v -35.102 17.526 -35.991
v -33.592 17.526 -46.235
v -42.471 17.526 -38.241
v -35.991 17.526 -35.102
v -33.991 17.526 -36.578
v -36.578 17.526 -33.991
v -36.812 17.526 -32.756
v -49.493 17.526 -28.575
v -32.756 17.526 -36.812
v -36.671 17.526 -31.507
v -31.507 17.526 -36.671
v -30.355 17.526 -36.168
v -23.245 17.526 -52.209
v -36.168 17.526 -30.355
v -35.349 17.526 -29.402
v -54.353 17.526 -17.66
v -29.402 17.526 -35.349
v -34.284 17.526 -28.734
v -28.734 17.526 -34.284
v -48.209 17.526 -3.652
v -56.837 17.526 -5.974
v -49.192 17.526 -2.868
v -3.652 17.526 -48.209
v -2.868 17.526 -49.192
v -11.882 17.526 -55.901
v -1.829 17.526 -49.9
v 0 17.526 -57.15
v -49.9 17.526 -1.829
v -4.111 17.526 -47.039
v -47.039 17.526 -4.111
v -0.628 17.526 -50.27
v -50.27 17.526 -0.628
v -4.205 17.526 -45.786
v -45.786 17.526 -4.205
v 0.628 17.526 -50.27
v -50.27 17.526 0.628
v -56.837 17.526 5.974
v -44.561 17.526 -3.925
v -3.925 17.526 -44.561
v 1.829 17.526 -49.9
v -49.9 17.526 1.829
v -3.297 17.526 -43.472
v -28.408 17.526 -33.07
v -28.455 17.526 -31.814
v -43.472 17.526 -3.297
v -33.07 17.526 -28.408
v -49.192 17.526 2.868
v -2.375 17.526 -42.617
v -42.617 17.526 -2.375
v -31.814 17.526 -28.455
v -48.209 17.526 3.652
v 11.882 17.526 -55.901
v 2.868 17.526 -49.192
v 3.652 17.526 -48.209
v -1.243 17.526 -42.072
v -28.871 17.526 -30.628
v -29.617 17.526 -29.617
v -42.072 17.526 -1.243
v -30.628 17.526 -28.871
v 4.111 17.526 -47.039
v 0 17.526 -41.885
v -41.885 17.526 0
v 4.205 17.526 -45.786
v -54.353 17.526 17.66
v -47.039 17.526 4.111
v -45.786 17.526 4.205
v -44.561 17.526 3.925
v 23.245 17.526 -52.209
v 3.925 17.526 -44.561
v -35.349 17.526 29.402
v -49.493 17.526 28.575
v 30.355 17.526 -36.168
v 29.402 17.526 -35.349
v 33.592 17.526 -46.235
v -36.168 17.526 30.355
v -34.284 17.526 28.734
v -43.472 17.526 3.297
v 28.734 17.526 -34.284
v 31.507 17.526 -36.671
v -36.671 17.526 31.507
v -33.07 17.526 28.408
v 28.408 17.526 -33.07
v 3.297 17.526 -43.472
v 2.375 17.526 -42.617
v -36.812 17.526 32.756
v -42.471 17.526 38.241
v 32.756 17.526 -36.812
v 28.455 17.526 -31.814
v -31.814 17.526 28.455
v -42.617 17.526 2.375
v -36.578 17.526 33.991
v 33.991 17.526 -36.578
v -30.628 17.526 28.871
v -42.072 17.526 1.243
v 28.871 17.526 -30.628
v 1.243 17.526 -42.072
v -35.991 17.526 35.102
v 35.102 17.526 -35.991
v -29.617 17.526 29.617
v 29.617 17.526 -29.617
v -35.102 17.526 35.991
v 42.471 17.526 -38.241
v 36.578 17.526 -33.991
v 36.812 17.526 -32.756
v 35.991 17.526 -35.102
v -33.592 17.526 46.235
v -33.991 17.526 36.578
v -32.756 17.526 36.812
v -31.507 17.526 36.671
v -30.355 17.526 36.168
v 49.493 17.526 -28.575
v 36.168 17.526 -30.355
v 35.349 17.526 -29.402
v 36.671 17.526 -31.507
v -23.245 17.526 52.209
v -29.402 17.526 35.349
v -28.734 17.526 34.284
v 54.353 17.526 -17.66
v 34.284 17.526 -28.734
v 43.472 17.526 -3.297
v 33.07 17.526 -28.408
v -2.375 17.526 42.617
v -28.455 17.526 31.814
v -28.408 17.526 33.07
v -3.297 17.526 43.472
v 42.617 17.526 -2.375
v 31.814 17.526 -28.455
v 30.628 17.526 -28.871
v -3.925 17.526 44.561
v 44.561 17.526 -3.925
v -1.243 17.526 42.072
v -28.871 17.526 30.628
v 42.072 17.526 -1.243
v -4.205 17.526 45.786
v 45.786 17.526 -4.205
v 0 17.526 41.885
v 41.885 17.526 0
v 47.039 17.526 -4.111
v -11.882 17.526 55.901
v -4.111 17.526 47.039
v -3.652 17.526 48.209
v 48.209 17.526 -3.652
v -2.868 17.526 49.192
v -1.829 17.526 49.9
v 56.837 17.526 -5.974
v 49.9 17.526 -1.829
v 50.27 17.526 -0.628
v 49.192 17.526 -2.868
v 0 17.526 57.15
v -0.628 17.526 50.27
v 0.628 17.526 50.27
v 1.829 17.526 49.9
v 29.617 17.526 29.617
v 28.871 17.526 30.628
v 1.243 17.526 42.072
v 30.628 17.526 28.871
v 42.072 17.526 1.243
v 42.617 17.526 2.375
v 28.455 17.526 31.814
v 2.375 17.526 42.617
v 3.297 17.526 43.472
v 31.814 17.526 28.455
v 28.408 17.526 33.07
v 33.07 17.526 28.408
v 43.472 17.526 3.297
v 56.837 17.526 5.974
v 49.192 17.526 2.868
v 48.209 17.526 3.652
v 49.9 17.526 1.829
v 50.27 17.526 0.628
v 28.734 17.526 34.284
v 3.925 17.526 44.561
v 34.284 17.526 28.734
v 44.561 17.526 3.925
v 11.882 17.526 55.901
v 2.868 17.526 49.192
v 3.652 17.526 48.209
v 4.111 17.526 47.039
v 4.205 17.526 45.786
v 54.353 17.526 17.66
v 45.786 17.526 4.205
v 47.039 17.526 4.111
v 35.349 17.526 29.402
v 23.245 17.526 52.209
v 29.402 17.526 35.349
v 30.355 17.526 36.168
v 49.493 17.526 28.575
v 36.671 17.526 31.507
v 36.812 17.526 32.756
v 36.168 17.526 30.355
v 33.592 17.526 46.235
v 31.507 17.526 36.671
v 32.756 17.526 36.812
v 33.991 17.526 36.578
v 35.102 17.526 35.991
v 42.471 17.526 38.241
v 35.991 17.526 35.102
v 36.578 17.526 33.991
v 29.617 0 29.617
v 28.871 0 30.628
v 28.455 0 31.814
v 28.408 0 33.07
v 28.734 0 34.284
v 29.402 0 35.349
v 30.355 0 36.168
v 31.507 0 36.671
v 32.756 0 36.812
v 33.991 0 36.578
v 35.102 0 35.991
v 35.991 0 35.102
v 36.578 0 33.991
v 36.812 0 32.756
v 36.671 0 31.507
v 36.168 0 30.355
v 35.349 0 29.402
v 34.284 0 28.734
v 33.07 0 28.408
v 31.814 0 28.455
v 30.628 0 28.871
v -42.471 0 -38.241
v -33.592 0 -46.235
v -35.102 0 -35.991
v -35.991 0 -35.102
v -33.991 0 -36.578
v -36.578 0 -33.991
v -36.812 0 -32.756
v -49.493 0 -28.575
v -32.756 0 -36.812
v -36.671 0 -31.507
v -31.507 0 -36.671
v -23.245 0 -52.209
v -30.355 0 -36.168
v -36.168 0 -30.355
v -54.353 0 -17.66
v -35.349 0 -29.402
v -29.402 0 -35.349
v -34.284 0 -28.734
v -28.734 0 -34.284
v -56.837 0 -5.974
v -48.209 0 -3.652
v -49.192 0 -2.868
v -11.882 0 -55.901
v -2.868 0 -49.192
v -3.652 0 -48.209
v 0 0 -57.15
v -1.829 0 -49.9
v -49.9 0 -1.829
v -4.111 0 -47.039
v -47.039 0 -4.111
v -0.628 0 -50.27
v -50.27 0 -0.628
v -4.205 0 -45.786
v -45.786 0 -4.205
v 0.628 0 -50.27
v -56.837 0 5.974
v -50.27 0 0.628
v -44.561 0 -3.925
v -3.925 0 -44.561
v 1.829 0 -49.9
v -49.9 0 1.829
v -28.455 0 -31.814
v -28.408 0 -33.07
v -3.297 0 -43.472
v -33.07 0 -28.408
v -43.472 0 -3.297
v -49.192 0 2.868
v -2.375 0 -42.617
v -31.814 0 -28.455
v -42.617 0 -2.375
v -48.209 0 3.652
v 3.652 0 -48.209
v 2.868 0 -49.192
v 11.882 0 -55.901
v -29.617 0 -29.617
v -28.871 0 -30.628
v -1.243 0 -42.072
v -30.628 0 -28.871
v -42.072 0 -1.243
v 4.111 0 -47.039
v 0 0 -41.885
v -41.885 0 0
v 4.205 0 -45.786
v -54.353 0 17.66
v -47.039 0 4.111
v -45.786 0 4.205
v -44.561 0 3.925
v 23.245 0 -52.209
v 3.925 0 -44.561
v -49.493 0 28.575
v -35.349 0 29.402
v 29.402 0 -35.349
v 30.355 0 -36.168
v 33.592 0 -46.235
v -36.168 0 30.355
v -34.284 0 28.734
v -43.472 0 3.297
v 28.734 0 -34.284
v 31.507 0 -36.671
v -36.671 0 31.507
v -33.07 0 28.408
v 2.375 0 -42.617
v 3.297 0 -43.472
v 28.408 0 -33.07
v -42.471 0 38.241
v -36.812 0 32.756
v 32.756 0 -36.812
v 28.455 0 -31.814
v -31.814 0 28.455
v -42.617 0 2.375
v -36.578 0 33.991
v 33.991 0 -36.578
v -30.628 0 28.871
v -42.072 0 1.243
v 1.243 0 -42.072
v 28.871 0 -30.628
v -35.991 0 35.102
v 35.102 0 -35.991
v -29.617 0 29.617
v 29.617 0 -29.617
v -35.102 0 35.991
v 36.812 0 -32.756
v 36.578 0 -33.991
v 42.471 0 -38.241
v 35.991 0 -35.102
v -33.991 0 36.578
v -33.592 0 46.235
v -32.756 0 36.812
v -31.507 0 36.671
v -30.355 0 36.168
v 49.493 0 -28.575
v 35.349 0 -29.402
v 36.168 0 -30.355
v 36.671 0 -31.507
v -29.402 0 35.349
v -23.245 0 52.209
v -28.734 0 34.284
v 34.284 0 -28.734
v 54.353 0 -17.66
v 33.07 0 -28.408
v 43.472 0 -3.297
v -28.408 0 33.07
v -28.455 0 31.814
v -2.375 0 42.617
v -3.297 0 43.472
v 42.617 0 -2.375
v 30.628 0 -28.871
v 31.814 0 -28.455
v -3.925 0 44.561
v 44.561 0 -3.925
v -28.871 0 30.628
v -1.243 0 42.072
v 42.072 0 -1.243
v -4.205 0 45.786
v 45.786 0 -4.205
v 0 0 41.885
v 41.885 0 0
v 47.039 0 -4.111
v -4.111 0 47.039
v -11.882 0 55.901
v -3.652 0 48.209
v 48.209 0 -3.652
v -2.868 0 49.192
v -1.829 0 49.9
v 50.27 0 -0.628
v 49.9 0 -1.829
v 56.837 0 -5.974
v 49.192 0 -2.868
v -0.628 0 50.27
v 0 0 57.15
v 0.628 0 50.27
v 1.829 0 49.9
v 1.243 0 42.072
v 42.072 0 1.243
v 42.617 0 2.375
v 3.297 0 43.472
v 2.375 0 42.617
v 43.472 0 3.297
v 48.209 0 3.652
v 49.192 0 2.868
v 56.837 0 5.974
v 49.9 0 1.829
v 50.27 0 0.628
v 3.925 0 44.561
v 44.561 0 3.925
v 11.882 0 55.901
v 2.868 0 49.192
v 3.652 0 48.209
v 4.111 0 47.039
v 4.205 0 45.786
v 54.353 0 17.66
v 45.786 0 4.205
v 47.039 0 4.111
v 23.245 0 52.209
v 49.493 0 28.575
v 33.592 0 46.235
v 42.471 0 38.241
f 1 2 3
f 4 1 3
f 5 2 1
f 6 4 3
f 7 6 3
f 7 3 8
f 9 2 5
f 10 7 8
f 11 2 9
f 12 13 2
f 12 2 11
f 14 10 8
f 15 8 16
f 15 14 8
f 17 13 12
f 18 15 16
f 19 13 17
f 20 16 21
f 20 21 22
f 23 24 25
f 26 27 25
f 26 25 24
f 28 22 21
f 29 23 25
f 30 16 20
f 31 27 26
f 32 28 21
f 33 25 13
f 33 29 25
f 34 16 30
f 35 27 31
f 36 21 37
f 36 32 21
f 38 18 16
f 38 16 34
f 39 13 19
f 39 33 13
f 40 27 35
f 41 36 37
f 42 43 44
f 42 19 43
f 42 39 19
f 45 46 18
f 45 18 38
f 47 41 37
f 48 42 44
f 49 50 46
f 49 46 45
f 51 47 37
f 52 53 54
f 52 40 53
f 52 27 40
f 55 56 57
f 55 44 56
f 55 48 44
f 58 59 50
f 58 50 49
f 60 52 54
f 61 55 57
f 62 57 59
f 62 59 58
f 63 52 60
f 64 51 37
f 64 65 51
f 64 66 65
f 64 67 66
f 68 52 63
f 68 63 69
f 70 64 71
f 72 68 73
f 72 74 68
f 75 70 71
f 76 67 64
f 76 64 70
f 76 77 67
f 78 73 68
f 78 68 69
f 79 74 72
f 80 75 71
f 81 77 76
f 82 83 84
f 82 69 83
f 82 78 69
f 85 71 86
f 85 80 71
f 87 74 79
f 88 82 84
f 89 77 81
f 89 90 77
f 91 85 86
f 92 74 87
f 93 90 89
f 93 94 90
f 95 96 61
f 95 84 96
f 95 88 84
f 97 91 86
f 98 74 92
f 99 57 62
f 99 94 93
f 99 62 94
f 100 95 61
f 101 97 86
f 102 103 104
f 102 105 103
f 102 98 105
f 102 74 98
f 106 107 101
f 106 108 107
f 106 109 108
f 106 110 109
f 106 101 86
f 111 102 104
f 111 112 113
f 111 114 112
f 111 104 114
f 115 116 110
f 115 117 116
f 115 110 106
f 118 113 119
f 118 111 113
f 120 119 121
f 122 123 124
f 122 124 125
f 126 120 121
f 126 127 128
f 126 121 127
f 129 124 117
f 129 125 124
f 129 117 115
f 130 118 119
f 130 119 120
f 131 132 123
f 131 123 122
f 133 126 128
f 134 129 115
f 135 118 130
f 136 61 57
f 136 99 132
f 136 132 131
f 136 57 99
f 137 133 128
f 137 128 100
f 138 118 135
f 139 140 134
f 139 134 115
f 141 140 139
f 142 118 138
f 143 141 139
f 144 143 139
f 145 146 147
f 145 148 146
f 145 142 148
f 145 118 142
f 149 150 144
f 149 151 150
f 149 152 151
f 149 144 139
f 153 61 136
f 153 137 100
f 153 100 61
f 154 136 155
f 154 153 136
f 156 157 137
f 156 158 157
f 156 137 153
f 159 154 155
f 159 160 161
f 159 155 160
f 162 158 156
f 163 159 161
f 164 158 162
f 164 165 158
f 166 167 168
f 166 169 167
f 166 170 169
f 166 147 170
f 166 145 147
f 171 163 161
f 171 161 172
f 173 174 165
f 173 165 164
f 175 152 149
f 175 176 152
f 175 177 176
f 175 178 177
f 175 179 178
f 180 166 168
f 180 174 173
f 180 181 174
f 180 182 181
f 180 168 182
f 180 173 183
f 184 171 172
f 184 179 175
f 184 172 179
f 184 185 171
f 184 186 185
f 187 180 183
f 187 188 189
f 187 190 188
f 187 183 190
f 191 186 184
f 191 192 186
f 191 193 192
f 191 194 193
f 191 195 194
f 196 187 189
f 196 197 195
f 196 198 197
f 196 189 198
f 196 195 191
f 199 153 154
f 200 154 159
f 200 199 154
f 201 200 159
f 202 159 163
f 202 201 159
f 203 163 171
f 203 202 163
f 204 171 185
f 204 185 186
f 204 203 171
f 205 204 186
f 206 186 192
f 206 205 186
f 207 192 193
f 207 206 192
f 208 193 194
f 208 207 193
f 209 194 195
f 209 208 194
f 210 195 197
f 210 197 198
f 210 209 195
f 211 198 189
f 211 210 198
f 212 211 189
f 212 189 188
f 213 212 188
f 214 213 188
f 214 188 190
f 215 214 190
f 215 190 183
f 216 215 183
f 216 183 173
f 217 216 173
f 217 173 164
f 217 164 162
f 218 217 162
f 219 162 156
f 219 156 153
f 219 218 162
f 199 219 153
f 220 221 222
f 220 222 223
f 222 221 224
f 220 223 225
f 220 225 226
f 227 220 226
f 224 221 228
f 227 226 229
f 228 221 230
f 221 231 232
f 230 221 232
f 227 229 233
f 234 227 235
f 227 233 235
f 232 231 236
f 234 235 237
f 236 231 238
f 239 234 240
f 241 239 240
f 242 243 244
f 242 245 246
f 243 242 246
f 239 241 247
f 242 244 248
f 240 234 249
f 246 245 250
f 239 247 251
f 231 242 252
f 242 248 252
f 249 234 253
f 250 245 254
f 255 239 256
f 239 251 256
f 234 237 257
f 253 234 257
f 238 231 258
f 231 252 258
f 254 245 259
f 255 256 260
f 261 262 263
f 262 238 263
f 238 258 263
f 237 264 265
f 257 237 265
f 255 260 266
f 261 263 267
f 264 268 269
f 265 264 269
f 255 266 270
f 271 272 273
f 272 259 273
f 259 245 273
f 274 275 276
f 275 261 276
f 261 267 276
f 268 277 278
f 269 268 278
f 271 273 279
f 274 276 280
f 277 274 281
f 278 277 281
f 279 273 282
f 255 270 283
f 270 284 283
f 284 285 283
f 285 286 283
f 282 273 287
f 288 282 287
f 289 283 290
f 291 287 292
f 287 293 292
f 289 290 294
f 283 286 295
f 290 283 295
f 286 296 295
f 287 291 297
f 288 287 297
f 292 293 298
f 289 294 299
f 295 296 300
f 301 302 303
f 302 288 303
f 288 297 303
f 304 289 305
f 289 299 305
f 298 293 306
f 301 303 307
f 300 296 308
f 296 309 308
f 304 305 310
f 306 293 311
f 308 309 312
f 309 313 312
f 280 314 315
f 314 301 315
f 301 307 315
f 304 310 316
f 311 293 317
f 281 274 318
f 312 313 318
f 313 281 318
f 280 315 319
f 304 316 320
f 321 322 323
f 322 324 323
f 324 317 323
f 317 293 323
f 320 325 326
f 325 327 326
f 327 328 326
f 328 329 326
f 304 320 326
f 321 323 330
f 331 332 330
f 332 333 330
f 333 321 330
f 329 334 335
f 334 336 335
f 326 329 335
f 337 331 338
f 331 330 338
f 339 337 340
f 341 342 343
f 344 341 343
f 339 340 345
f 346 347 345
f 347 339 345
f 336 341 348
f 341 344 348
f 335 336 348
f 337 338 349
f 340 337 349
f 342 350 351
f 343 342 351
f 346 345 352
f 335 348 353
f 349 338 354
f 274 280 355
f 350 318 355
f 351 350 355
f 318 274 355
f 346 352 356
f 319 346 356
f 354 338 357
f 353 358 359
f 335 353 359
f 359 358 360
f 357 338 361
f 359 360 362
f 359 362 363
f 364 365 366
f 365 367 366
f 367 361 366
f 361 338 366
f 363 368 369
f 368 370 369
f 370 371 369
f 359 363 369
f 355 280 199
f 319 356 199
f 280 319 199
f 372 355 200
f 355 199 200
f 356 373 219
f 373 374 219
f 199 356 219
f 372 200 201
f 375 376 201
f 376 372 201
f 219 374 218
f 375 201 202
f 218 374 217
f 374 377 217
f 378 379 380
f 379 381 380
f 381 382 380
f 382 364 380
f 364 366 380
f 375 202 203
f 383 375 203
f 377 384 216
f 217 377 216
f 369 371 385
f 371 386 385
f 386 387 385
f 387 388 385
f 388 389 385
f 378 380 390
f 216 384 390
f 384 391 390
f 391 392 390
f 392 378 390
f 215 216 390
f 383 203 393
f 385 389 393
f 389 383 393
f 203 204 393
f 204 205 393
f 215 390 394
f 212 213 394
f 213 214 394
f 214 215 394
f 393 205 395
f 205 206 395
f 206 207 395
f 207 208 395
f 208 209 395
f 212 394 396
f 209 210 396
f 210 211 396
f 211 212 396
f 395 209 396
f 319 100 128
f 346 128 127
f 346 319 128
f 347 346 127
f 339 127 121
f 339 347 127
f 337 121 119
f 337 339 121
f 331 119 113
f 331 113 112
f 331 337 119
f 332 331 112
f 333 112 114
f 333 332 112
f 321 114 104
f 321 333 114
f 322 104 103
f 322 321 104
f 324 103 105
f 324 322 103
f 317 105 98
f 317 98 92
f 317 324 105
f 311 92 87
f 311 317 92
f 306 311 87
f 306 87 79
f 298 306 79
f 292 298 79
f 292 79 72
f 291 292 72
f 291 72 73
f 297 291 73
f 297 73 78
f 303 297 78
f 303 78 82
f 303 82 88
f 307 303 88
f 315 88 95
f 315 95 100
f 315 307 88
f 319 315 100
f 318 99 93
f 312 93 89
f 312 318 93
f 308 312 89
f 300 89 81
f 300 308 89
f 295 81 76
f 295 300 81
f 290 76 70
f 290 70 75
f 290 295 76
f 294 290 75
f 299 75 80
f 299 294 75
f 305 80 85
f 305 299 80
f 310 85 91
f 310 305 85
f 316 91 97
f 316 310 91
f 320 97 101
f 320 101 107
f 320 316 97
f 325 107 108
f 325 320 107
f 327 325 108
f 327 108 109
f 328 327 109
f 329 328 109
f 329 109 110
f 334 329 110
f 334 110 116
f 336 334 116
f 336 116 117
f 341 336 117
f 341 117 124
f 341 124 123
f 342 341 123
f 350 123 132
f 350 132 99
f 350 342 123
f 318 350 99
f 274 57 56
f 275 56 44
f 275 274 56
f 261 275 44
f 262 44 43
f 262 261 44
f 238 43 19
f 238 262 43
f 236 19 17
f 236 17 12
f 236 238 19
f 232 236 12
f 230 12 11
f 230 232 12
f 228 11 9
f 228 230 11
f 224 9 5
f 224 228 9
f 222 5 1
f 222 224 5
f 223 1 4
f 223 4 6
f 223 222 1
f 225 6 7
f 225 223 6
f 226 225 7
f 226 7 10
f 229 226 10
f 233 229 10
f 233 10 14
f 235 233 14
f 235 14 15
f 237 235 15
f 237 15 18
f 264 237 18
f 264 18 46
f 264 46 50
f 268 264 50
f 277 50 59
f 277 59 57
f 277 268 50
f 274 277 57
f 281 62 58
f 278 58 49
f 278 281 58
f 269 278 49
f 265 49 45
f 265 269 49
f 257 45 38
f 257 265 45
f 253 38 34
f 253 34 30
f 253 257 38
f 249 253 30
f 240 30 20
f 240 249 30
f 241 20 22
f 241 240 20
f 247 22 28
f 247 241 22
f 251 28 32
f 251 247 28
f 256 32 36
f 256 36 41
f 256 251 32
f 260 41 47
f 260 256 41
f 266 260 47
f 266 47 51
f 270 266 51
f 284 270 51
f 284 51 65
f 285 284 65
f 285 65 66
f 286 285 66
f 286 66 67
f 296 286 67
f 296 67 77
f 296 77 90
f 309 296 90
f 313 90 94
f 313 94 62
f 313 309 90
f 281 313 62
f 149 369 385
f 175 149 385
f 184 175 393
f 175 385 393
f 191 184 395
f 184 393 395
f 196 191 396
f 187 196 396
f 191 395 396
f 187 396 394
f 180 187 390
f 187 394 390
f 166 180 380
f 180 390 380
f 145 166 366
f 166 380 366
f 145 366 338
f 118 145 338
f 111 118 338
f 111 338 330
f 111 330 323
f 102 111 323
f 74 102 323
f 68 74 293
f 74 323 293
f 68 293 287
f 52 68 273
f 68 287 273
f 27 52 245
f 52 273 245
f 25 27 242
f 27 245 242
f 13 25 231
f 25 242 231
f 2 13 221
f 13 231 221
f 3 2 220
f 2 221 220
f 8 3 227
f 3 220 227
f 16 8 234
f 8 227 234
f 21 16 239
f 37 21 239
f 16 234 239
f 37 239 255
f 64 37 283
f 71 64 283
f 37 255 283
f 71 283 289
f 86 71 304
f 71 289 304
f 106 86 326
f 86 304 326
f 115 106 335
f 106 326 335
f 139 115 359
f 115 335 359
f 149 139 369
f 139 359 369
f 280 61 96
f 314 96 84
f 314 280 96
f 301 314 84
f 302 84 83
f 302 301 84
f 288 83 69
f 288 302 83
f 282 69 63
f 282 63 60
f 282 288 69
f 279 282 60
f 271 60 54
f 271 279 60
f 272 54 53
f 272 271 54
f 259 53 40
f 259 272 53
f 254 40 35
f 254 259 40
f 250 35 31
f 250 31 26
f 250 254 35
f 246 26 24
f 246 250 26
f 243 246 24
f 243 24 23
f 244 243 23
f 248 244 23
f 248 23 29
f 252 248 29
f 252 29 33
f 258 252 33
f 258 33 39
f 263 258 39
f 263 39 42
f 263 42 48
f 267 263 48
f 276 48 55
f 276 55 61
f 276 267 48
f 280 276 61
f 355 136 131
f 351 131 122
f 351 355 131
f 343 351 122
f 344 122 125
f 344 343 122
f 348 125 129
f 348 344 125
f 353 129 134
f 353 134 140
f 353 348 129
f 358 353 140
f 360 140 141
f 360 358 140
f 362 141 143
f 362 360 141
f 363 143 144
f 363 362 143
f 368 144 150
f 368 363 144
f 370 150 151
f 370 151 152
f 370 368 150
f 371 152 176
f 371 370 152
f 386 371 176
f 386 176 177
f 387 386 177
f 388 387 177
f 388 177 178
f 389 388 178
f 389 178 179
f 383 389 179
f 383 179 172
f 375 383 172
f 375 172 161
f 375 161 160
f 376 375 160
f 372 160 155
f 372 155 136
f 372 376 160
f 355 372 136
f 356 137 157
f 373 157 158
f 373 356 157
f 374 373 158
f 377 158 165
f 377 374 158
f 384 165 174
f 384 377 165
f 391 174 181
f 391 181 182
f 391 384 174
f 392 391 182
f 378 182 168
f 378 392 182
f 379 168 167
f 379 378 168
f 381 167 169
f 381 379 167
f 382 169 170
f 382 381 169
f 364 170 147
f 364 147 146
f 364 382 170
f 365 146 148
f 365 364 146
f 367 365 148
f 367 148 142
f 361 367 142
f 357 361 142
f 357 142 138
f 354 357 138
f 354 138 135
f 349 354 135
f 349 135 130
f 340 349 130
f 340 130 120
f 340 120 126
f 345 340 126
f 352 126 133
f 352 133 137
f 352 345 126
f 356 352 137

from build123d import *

# Parameters (mm, degrees)
SKETCH1_R          = 57.15
EXTRUDE1_DEPTH     = 17.526
SKETCH2_R          = 4.2164
CUT_EXTRUDE2_DEPTH = 17.526
CIRPATTERN1_COUNT  = 8


with BuildPart() as part:
    # Sketch1 → Extrude1 (new body)
    with BuildSketch(Plane(origin=(0, 0, 0), x_dir=(1, 0, 0), z_dir=(0, 1, 0))):
        Circle(SKETCH1_R)
    extrude(amount=EXTRUDE1_DEPTH)

    # Sketch2 → Cut-Extrude2 (cut)
    with BuildSketch(Plane(origin=(0, 0, 0), x_dir=(1, 0, 0), z_dir=(0, 1, 0))):
        with Locations((0, 46.101)):
            Circle(SKETCH2_R)
    cut_extrude2 = extrude(amount=CUT_EXTRUDE2_DEPTH, mode=Mode.SUBTRACT)

    # CirPattern1: Cut-Extrude2 ×8 about axis
    cirpattern1_axis = Axis((0, 58.676993495, 0), (0, -1, 0))
    for i in range(1, CIRPATTERN1_COUNT):
        add(cut_extrude2.rotate(cirpattern1_axis, i * 360 / CIRPATTERN1_COUNT), mode=Mode.SUBTRACT)


solid = part.part
